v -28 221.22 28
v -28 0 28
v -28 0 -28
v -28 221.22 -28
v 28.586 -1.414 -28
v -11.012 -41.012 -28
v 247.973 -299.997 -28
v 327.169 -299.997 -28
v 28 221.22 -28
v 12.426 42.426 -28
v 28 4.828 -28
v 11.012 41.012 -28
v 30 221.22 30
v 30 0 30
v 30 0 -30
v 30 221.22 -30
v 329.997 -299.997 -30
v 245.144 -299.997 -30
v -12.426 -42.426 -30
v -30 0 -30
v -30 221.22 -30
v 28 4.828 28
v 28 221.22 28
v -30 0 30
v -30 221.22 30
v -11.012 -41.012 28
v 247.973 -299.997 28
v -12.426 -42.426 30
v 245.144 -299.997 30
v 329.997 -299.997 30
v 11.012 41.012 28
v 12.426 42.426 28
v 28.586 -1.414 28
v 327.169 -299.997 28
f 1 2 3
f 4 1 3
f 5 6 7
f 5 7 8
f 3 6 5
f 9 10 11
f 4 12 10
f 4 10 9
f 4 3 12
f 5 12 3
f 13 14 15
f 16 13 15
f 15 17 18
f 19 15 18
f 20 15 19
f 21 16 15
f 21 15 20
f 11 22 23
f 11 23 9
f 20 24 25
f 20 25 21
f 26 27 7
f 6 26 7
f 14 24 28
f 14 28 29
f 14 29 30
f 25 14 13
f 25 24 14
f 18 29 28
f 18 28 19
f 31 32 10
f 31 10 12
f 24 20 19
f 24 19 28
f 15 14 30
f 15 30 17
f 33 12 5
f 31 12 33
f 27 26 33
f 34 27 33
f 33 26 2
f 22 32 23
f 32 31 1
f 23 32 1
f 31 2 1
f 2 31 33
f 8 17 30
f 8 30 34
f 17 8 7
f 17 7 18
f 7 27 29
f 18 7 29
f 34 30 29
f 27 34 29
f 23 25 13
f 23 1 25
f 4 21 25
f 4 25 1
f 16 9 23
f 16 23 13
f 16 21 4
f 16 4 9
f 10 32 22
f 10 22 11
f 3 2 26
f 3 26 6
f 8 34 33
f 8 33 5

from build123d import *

# Parameters (mm, degrees)
CROQUIS1_W              = 60
CROQUIS1_H              = 60
CROQUIS1_W_2            = 56
CROQUIS1_H_2            = 56
SALIENTE_EXTRUIR1_DEPTH = 221.22
CROQUIS3_W              = 60
CROQUIS3_H              = 60
CROQUIS3_W_2            = 56
CROQUIS3_H_2            = 56
SALIENTE_EXTRUIR2_DEPTH = 424.26
CORTAR_EXTRUIR1_DEPTH   = 61
CROQUIS14_W             = 60
CROQUIS14_H             = 60
CROQUIS14_W_2           = 56
CROQUIS14_H_2           = 56


with BuildPart() as part:
    # Croquis1 → Saliente-Extruir1 (new body)
    with BuildSketch(Plane(origin=(0, 0, 0), x_dir=(1, 0, 0), z_dir=(0, 1, 0))):
        Rectangle(CROQUIS1_W, CROQUIS1_H)
        Rectangle(CROQUIS1_W_2, CROQUIS1_H_2, mode=Mode.SUBTRACT)
    extrude(amount=SALIENTE_EXTRUIR1_DEPTH)



with BuildPart() as body_2:
    # Croquis3 → Saliente-Extruir2 (new body)
    with BuildSketch(Plane(origin=(15, -15, 0), x_dir=(0, 0, -1), z_dir=(0.707106781, -0.707106781, 0))):
        with Locations((0, -8.786796564)):
            Rectangle(CROQUIS3_W, CROQUIS3_H)
        with Locations((0, -8.786796564)):
            Rectangle(CROQUIS3_W_2, CROQUIS3_H_2, mode=Mode.SUBTRACT)
    extrude(amount=SALIENTE_EXTRUIR2_DEPTH)

    # Croquis10 → Cortar-Extruir1 (cut, through all)
    with BuildSketch(Plane.XY.offset(30)):
        Polygon((287.570716115, -342.423529857), (329.997122986, -299.997122986), (245.144309244, -299.997122986), align=None)
    extrude(amount=-CORTAR_EXTRUIR1_DEPTH, mode=Mode.SUBTRACT)


with BuildPart() as part_1:
    add(part.part)

    add(body_2.part)  # Barrer2 merges body 2
    # Barrer2: sweep along a path in Croquis13
    with BuildLine(Plane.XY.offset(30)) as barrer2_path:
        Line((-12.426406871, -42.426406871), (-30, 0))
    # Croquis14 → Barrer2 (sweep)
    with BuildSketch(Plane(origin=(15, -15, 0), x_dir=(0, 0, 1), z_dir=(-0.707106781, 0.707106781, 0))):
        with Locations((0, -8.786796564)):
            Rectangle(CROQUIS14_W, CROQUIS14_H)
        with Locations((0, -8.786796564)):
            Rectangle(CROQUIS14_W_2, CROQUIS14_H_2, mode=Mode.SUBTRACT)
    sweep(path=barrer2_path.line)


solid = part_1.part
